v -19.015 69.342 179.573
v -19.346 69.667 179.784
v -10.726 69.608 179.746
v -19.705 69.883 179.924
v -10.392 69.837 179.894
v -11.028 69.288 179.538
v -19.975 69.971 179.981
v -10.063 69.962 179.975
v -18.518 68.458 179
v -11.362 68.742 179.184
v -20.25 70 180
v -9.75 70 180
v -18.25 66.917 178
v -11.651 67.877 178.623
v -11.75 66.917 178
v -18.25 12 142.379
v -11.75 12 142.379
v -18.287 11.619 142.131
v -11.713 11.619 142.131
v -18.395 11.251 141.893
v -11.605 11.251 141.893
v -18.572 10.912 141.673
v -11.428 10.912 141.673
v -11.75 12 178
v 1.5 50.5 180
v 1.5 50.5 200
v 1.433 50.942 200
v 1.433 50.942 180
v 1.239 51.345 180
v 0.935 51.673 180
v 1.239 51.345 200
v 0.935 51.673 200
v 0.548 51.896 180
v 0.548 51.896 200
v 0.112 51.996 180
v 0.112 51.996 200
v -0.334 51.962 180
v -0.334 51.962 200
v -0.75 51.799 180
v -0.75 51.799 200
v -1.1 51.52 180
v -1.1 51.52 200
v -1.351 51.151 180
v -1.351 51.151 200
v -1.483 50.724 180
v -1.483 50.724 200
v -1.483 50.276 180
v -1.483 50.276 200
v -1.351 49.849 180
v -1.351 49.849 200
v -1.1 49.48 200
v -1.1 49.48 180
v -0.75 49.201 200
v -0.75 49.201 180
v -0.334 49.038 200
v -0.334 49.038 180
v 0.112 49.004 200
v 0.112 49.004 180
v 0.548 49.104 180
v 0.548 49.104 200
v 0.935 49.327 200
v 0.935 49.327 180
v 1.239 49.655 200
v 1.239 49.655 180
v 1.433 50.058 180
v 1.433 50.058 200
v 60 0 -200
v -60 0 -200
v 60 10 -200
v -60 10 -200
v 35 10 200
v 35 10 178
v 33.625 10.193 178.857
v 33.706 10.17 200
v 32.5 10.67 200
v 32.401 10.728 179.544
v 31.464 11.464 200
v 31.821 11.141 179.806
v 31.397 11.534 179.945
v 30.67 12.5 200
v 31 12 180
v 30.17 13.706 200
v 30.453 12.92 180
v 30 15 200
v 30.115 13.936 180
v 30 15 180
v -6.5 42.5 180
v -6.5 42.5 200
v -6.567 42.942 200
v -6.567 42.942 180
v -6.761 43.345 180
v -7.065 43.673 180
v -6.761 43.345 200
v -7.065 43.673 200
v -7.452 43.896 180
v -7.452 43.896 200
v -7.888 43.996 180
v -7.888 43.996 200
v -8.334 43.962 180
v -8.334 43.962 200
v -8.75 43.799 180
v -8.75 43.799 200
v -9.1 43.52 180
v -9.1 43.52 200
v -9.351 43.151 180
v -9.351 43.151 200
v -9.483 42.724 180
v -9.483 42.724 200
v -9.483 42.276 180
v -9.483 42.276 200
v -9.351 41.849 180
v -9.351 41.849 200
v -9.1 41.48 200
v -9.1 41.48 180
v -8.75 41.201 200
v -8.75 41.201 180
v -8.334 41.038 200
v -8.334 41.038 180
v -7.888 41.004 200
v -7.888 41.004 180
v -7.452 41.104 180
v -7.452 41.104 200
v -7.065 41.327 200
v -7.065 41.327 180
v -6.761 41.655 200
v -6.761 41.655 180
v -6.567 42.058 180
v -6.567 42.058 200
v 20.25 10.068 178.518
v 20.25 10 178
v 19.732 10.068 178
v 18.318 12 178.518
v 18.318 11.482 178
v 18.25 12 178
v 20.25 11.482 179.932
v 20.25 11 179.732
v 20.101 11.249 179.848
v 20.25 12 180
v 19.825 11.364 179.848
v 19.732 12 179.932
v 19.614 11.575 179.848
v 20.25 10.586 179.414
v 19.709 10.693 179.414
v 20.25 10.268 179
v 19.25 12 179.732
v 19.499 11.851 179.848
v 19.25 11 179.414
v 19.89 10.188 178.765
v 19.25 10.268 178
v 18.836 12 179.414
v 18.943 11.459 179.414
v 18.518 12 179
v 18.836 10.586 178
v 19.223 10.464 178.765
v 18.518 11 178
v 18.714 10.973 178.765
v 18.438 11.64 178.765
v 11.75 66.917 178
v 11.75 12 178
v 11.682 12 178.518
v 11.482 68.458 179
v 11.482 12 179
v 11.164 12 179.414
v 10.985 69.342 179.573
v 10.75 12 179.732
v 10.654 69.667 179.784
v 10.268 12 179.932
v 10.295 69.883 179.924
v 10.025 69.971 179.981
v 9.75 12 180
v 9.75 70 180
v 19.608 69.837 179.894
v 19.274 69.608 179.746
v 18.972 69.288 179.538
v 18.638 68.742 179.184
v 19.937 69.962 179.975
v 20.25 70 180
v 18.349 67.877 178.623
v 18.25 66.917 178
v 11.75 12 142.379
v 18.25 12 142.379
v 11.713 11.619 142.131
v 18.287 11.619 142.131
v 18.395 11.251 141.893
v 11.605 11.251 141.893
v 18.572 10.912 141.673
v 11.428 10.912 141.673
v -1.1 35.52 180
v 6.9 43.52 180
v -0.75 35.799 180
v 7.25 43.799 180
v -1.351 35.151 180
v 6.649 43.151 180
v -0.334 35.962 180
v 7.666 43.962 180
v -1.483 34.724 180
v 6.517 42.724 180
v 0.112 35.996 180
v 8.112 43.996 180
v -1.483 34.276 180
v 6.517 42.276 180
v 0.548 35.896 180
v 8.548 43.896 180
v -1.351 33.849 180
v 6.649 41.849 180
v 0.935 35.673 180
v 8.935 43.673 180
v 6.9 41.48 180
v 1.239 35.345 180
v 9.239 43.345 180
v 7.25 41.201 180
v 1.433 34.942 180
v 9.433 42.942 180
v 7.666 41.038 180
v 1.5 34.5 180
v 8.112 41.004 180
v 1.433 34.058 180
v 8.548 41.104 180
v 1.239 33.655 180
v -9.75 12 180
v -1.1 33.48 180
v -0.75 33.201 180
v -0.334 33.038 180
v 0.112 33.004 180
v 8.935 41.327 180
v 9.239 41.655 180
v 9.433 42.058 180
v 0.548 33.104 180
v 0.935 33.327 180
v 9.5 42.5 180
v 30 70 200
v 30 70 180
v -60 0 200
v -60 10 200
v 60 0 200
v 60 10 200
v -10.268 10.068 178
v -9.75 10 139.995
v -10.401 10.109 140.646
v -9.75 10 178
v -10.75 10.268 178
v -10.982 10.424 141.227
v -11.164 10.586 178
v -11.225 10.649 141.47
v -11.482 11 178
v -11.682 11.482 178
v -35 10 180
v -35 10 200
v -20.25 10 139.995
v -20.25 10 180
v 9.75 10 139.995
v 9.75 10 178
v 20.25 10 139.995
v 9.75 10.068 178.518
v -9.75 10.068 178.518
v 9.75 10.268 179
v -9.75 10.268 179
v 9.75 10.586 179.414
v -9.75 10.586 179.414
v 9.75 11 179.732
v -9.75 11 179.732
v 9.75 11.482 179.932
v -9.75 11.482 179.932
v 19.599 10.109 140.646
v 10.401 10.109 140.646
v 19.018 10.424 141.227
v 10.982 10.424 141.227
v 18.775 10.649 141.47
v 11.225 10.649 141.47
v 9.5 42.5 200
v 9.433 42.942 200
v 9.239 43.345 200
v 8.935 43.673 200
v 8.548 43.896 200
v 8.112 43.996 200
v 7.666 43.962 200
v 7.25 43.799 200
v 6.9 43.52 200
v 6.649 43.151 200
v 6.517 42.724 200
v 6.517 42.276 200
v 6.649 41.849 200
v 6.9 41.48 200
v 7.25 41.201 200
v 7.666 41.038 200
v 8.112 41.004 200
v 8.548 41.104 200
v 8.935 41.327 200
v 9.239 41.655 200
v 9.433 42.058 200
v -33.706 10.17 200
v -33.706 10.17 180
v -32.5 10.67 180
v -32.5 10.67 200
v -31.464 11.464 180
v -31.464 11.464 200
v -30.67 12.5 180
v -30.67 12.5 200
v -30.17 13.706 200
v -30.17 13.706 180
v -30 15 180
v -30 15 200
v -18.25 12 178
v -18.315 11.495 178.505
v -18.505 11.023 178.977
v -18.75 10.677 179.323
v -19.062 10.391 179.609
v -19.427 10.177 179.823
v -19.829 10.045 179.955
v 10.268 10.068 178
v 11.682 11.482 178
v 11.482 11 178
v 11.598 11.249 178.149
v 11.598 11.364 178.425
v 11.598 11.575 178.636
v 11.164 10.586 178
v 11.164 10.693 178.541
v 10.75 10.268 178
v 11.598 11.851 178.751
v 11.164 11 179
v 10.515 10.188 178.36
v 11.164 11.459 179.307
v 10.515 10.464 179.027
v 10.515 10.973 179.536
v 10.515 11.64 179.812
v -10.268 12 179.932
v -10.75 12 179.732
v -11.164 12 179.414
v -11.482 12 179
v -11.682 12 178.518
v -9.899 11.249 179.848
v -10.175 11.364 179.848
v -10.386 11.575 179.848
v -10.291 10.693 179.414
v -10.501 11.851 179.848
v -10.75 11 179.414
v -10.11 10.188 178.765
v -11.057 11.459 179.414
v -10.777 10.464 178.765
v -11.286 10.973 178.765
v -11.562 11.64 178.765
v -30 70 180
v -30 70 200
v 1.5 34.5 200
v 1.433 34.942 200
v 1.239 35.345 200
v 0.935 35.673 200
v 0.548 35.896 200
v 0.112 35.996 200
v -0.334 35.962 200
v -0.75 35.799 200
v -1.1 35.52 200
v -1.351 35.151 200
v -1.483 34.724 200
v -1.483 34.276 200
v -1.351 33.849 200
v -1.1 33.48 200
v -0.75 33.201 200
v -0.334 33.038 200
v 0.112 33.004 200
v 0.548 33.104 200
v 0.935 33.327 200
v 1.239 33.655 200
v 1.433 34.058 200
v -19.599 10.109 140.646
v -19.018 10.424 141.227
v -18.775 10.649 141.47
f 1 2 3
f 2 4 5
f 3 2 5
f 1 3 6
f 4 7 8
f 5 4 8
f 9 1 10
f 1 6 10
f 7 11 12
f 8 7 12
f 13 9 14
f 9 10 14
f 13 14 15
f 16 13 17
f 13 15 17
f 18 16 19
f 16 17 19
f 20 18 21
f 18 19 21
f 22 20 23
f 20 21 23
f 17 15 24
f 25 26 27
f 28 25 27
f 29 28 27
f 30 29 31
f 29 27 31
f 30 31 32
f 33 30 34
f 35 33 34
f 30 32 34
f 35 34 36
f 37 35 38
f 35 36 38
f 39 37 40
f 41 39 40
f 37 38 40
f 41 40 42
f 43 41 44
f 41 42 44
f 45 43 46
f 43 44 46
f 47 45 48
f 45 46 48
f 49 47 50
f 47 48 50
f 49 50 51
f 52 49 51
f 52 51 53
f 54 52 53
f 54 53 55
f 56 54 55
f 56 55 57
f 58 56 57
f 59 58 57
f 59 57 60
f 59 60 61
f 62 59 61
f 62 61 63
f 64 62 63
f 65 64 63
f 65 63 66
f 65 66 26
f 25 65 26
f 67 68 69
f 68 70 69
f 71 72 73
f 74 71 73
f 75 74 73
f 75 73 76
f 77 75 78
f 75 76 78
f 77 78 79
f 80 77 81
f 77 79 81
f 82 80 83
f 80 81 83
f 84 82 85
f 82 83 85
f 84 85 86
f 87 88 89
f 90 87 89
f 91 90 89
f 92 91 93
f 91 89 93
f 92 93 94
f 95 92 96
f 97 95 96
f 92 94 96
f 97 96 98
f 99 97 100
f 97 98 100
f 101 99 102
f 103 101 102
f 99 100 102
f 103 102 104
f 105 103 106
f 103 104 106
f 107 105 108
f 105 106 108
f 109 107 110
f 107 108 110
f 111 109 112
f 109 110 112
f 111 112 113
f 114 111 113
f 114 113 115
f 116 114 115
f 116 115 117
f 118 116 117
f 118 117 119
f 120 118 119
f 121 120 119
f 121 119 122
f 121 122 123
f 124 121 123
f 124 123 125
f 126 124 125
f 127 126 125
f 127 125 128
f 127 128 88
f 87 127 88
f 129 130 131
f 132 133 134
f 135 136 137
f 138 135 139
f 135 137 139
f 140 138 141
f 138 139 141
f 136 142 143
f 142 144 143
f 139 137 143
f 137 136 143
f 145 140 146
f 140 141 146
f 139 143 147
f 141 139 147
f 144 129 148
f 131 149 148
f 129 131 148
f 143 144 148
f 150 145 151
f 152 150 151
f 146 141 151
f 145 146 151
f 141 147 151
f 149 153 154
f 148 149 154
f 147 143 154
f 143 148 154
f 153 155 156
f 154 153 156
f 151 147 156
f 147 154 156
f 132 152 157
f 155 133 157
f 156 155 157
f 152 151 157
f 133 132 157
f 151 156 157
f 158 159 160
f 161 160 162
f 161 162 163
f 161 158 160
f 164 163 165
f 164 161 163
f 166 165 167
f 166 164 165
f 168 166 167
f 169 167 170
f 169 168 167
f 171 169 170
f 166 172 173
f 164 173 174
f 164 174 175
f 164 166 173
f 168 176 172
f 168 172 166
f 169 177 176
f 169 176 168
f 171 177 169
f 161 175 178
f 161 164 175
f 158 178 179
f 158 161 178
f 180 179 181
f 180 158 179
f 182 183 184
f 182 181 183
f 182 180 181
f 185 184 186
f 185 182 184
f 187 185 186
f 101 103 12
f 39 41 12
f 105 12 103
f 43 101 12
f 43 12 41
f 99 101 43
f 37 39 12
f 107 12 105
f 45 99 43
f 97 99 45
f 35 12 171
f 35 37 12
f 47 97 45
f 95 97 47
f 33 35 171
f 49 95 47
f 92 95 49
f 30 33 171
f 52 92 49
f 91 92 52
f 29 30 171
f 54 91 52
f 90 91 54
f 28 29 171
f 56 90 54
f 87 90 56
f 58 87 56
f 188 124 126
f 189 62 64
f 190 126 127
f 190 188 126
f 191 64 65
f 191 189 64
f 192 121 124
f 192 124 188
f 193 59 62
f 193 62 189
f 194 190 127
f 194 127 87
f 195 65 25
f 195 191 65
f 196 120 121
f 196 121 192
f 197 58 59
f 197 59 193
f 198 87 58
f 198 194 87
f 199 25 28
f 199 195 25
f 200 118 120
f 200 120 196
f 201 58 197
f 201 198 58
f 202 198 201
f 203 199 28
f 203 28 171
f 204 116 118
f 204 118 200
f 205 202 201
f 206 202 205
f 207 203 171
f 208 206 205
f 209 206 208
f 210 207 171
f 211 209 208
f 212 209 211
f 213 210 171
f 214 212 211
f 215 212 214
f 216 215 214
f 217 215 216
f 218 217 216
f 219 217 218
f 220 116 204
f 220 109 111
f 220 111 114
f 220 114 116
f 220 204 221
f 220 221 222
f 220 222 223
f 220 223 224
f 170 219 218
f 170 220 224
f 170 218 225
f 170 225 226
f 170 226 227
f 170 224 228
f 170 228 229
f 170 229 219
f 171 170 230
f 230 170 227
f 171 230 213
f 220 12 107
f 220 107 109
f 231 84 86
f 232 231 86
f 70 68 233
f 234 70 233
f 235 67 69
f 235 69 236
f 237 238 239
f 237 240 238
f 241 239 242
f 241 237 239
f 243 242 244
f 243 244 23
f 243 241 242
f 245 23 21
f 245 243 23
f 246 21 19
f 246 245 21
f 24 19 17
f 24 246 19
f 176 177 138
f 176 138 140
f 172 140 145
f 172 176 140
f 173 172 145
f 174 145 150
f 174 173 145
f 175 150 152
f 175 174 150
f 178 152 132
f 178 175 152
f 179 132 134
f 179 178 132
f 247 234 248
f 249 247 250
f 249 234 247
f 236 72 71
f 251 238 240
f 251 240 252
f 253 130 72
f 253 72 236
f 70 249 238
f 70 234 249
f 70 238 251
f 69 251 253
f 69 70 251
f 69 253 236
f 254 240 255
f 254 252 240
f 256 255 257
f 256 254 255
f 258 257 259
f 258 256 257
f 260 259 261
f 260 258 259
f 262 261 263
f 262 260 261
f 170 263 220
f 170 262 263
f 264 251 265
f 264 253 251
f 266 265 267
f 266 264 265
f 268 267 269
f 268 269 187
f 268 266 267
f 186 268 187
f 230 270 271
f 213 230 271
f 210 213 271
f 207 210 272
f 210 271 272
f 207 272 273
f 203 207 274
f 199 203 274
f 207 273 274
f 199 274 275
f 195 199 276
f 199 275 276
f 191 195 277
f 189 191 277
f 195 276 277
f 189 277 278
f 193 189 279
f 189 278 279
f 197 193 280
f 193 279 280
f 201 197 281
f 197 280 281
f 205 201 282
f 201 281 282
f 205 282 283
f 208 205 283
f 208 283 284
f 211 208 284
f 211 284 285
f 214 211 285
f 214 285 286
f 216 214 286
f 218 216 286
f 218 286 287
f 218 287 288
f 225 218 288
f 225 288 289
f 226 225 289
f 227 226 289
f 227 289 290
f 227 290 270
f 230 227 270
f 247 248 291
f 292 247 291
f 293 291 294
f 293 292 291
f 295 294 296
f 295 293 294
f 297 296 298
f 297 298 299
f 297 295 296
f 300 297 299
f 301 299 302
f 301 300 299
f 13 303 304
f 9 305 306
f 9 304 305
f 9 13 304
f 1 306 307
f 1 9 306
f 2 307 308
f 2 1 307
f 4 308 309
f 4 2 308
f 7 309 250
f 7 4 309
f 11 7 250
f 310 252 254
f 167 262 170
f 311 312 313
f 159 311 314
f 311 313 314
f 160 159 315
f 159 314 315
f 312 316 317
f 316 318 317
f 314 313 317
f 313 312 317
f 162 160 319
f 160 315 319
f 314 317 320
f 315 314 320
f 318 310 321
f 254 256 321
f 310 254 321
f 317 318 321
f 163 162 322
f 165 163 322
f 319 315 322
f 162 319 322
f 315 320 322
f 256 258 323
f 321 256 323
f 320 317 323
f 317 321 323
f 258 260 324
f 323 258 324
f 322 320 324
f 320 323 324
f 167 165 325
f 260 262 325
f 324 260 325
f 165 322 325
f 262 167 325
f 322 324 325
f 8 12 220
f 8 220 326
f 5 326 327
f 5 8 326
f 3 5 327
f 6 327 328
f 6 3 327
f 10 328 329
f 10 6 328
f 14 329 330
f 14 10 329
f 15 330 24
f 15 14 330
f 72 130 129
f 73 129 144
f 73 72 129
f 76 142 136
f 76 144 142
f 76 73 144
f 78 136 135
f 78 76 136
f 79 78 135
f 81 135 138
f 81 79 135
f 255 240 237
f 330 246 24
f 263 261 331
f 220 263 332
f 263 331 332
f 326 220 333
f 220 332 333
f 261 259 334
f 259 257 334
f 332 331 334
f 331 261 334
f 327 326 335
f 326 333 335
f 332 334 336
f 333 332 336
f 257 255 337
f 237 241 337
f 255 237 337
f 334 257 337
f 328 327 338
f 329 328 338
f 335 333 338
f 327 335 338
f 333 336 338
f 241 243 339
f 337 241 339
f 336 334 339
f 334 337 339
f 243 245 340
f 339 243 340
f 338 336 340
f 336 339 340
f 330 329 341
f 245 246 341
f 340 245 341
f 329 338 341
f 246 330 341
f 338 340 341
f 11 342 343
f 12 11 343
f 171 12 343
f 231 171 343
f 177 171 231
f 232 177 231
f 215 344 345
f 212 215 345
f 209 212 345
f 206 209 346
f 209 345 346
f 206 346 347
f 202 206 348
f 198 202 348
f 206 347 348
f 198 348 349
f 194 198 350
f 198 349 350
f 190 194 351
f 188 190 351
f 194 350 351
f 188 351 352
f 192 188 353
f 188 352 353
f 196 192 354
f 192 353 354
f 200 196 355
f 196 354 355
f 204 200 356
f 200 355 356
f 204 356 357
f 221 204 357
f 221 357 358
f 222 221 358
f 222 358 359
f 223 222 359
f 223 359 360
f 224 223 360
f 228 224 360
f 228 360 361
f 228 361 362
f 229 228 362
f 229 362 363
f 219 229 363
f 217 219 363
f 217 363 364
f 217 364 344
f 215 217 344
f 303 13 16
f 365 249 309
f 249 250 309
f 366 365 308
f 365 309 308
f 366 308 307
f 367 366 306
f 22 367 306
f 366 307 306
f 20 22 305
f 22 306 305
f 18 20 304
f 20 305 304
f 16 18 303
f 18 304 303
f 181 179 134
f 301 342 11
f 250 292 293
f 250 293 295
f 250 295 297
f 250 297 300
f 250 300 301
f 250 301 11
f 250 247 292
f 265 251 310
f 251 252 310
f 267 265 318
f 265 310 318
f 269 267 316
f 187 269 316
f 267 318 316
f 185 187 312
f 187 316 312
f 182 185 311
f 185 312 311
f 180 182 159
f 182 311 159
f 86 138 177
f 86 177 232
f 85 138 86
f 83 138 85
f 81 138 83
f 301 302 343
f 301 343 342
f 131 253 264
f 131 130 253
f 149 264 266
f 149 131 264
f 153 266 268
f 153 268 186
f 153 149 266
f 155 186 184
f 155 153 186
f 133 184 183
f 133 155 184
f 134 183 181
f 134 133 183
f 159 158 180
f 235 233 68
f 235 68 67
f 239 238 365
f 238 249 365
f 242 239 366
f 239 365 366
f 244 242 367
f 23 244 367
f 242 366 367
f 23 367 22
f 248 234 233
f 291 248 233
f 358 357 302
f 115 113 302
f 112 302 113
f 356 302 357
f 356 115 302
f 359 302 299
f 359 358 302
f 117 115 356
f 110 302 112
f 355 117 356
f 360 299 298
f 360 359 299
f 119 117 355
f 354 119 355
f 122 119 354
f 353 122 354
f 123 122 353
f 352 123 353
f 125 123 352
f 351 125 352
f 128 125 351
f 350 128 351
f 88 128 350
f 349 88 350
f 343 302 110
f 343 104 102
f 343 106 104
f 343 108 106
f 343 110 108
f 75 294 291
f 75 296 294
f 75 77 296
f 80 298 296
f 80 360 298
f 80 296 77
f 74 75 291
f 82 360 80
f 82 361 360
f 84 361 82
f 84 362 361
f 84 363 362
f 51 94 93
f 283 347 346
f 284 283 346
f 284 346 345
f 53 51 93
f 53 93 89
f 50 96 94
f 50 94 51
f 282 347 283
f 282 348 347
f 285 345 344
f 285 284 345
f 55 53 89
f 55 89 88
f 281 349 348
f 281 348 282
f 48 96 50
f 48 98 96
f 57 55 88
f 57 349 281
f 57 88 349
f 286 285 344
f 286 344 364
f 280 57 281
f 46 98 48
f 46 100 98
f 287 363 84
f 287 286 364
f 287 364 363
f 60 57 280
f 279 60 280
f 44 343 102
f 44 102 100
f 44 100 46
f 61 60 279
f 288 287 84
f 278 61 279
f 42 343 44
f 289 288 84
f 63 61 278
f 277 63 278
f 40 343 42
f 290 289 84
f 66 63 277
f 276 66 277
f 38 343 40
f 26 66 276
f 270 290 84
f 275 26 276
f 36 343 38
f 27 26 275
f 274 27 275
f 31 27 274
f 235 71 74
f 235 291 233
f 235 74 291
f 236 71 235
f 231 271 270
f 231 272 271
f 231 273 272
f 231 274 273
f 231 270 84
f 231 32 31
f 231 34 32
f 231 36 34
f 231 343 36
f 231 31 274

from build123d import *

# Parameters (mm, degrees)
SKETCH2_W           = 120
SKETCH2_H           = 400
THICKEN1_T1         = 10
SKETCH3_W           = 60
SKETCH3_H           = 20
BOSS_EXTRUDE1_DEPTH = 60
FILLET3_R           = 5
SKETCH5_R           = 1.5
CUT_EXTRUDE4_DEPTH  = 31
RIB1_REACH          = 226.778
SKETCH8_WALL_W      = 523.072195762
SKETCH8_WALL_H      = 6.5
FILLET4_R           = 2


with BuildPart() as body_1:
    # Sketch2 → Surface-Plane1: a flat surface bounded by the sketch
    with BuildSketch(Plane(origin=(0, 0, 0), x_dir=(1, 0, 0), z_dir=(0, 1, 0)), mode=Mode.PRIVATE) as surface_plane1_1_region:
        Rectangle(SKETCH2_W, SKETCH2_H)
    surface_plane1_1 = surface_plane1_1_region.sketch.faces()[0]
    add(Solid.thicken(surface_plane1_1, THICKEN1_T1))

    # Sketch3 → Boss-Extrude1 (add)
    with BuildSketch(Plane(origin=(0, 10, 0), x_dir=(1, 0, 0), z_dir=(0, 1, 0))):
        with Locations((0, -190)):
            Rectangle(SKETCH3_W, SKETCH3_H)
    extrude(amount=BOSS_EXTRUDE1_DEPTH)

    # Fillet3
    fillet3_edges = [body_1.edges().sort_by_distance(p)[0] for p in [
        (30, 10, 190),
        (-30, 10, 190),
    ]]
    fillet(fillet3_edges, radius=FILLET3_R)

    # Sketch5 → Cut-Extrude4 (cut)
    with BuildSketch(Plane.XY.offset(200)):
        with Locations((0, 50.5)):
            Circle(SKETCH5_R)
        with Locations((-8, 42.5)):
            Circle(SKETCH5_R)
        with Locations((0, 34.5)):
            Circle(SKETCH5_R)
        with Locations((8, 42.5)):
            Circle(SKETCH5_R)
    extrude(amount=-CUT_EXTRUDE4_DEPTH, mode=Mode.SUBTRACT)

    # Sketch8 wall → Rib1 (add, up to next)
    with BuildSketch(Plane(origin=(15, 40, 160.540675435), x_dir=(0, -0.838963009324, -0.544188449882), z_dir=(0, 0.544188449882, -0.838963009324)), mode=Mode.PRIVATE) as rib1_sk1:
        Rectangle(SKETCH8_WALL_W, SKETCH8_WALL_H)
    rib1_tool1 = extrude(rib1_sk1.sketch, amount=-RIB1_REACH, mode=Mode.PRIVATE) - body_1.part
    rib1 = rib1_tool1.solids().sort_by_distance((15, 40, 160.540675435))[0]
    add(rib1)

    # Mirror1: Rib1 across plane
    add(rib1.mirror(Plane(origin=(0, 0, 0), x_dir=(0, 0, 1), z_dir=(1, 0, 0))))

    # Fillet4
    fillet4_edges = [body_1.edges().sort_by_distance(p)[0] for p in [
        (-18.25, 10, 160.540675435),
        (-15, 10, 141.08135087),
        (-11.75, 10, 160.540675435),
        (0, 10, 180),
        (11.75, 10, 160.540675435),
        (15, 10, 141.08135087),
        (18.25, 10, 160.540675435),
        (26.625, 10, 180),
        (-18.25, 40, 180),
        (-11.75, 40, 180),
        (11.75, 40, 180),
        (18.25, 40, 180),
    ]]
    fillet(fillet4_edges, radius=FILLET4_R)


solid = body_1.part
